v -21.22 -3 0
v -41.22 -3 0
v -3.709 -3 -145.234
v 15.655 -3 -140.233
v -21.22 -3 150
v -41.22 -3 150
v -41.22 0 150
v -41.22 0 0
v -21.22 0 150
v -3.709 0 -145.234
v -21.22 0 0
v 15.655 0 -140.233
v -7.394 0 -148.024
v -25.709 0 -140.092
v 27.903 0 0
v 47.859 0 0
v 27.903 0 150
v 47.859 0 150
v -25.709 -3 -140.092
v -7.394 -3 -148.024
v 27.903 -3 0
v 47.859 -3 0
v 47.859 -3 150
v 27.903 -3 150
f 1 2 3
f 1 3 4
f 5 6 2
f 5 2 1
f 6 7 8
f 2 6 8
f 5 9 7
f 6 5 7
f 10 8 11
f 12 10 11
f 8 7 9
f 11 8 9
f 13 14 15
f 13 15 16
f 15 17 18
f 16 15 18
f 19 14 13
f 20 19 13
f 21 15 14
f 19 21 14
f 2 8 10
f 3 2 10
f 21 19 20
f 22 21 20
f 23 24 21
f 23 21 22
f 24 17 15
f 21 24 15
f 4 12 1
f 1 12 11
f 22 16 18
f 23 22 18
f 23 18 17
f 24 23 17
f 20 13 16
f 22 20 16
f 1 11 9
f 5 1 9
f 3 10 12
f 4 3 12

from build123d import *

# Parameters (mm, degrees)
F1_DEPTH = 3
F3_DEPTH = 3


with BuildPart() as f1:
    # F0 (on Front) → F1 (new body)
    with BuildSketch(Plane.XZ):
        Polygon((-41.219511, 150), (-41.219511, 0), (-3.709068, -145.234179), (15.655489, -140.232786), (-21.219511, 0), (-21.219511, 150), align=None)
    extrude(amount=F1_DEPTH)


with BuildPart() as f3:
    # F2 (on Front) → F3 (new body)
    with BuildSketch(Plane.XZ):
        Polygon((47.858869, 150), (27.903363, 150), (27.903363, 0), (-25.709153, -140.091749), (-7.394317, -148.023936), (47.858869, 0), align=None)
    extrude(amount=F3_DEPTH)


solid = Compound([f1.part, f3.part])
